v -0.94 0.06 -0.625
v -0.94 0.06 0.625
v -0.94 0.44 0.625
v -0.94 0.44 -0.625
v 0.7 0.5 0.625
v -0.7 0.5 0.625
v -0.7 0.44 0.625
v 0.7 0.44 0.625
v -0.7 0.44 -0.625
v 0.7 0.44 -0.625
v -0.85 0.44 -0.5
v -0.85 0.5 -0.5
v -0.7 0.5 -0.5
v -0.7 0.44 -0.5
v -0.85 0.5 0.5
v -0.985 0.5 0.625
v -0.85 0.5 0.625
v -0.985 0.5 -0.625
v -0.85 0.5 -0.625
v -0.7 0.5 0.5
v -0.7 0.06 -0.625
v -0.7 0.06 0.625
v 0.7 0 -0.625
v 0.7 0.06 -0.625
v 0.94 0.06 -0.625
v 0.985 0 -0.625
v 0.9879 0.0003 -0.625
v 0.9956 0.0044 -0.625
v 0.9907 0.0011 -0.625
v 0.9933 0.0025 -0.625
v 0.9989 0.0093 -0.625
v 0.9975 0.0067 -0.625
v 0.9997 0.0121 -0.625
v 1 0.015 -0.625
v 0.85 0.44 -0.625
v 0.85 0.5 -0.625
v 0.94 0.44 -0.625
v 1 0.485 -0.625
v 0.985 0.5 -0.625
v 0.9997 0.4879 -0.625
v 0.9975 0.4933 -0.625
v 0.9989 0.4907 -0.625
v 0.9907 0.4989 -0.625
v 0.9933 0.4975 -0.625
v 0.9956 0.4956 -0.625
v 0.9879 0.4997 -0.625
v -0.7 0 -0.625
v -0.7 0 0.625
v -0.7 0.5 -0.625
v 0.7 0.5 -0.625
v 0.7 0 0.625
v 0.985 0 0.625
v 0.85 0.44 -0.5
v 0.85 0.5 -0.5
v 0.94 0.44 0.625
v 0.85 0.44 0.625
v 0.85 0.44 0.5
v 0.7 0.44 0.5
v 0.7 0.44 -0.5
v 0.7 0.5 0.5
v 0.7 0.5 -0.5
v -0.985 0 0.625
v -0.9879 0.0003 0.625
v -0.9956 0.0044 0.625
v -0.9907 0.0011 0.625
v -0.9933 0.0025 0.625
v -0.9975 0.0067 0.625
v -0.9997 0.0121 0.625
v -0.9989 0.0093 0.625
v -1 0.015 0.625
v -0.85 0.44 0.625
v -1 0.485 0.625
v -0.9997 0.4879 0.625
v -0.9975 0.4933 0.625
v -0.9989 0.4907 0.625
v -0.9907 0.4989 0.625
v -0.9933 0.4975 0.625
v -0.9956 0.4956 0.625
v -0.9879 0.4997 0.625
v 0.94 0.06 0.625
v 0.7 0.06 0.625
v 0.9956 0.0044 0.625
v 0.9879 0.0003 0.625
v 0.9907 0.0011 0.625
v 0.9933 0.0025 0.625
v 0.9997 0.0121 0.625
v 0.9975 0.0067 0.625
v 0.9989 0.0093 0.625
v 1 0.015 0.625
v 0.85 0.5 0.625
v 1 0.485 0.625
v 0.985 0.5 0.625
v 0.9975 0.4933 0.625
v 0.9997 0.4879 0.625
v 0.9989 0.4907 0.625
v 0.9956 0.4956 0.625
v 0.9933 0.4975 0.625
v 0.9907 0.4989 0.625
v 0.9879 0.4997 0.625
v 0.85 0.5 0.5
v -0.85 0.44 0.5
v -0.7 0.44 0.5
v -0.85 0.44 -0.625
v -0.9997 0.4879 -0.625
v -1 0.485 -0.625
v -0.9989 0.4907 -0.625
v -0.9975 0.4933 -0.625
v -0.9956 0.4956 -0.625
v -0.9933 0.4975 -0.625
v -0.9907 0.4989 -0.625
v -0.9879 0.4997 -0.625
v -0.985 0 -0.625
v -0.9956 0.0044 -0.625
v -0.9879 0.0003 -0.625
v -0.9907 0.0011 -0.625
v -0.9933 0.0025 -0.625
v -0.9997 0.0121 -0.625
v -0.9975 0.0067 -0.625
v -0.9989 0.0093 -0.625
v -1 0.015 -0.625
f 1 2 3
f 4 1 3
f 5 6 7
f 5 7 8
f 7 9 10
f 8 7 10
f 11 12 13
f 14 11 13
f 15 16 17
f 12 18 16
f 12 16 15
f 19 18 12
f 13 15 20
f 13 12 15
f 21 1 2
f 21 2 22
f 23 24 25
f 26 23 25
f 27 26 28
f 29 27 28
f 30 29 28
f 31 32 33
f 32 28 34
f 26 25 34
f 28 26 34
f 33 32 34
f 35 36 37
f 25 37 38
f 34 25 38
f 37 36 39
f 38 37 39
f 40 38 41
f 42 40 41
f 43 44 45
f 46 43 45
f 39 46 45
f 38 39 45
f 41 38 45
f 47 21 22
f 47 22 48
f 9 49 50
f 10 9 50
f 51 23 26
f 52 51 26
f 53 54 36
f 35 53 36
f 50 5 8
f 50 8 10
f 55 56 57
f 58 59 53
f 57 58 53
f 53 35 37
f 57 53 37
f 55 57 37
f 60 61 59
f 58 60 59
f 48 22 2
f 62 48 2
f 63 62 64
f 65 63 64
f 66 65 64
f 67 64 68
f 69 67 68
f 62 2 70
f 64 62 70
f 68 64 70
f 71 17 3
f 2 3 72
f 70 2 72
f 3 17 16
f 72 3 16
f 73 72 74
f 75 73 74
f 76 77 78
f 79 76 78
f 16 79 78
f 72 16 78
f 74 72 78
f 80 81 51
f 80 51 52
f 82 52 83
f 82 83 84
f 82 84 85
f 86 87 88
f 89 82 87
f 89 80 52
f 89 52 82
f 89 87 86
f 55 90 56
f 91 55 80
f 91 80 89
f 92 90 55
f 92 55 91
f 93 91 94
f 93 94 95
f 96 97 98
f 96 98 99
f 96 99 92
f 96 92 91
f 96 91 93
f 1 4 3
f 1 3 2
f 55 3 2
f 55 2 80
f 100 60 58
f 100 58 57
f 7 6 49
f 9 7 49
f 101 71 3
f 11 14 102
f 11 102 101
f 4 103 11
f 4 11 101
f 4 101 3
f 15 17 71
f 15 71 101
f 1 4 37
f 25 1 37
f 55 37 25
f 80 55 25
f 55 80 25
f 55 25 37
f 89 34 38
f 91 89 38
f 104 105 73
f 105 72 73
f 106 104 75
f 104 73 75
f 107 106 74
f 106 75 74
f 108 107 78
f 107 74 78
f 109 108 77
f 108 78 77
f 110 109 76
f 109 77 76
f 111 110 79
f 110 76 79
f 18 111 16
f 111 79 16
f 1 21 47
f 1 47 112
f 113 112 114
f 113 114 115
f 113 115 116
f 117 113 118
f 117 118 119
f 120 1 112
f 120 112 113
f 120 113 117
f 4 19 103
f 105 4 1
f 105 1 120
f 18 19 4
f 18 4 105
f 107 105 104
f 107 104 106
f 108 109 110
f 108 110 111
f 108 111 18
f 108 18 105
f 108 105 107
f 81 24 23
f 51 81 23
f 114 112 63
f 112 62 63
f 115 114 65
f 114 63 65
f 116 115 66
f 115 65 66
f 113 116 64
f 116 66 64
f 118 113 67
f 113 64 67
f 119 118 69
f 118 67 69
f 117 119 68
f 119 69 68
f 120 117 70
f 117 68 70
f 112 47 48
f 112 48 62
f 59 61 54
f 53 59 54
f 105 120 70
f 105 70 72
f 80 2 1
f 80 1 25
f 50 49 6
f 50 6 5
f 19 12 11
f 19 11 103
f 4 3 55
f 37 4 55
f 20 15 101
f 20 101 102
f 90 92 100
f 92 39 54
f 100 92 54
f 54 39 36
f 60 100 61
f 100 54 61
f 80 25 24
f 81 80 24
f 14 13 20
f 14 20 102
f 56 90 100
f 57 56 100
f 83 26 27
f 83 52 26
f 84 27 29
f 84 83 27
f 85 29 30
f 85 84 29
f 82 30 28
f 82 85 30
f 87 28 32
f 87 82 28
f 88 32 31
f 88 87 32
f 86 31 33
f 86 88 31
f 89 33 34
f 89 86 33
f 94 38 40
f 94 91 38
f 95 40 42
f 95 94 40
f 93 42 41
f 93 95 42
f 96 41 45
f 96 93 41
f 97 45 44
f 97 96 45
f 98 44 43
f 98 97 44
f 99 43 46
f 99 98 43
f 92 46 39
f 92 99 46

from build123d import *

# Parameters (mm, degrees)
BOSS_EXTRUDE1_DEPTH        = 0.625
BOSS_EXTRUDE1_DEPTH_BACK   = 0.625
BOSS_EXTRUDE1_2_DEPTH      = 0.625
BOSS_EXTRUDE1_2_DEPTH_BACK = 0.625
SKETCH3_W                  = 1.7
SKETCH3_H                  = 0.125
CUT_EXTRUDE1_DEPTH         = 0.06
FILLET1_R                  = 0.015
FILLET2_R                  = 0.015
SKETCH4_W                  = 1.88
SKETCH4_H                  = 0.38
BOSS_EXTRUDE2_DEPTH        = 1.25
SKETCH5_W                  = 1.4
SKETCH5_H                  = 1.25
BOSS_EXTRUDE3_DEPTH        = 0.06


with BuildPart() as part:
    # Sketch2 → Boss-Extrude1 (new, two sides: drawn at the far end of the back side and taken through both)
    with BuildSketch(Plane.XY.offset(-BOSS_EXTRUDE1_DEPTH_BACK)):
        Polygon((-0.7, 0), (-1, 0), (-1, 0.5), (-0.7, 0.5), (-0.7, 0.44), (-0.94, 0.44), (-0.94, 0.06), (-0.7, 0.06), align=None)
    extrude(amount=BOSS_EXTRUDE1_DEPTH + BOSS_EXTRUDE1_DEPTH_BACK)


with BuildPart() as body_2:
    # Sketch2 → Boss-Extrude1 2 (new, two sides: drawn at the far end of the back side and taken through both)
    with BuildSketch(Plane.XY.offset(-BOSS_EXTRUDE1_2_DEPTH_BACK)):
        Polygon((0.7, 0.06), (0.7, 0), (1, 0), (1, 0.5), (0.7, 0.5), (0.7, 0.44), (0.94, 0.44), (0.94, 0.06), align=None)
    extrude(amount=BOSS_EXTRUDE1_2_DEPTH + BOSS_EXTRUDE1_2_DEPTH_BACK)


with BuildPart() as cut_extrude1_tool:
    # Sketch3 → Cut-Extrude1 (new body)
    with BuildSketch(Plane(origin=(0, 0.5, 0), x_dir=(1, 0, 0), z_dir=(0, 1, 0))):
        with Locations((0, 0.5625)):
            Rectangle(SKETCH3_W, SKETCH3_H)
        with Locations((0, -0.5625)):
            Rectangle(SKETCH3_W, SKETCH3_H)
    extrude(amount=-CUT_EXTRUDE1_DEPTH)


with BuildPart() as part_1:
    add(part.part)

    # Cut-Extrude1: cut by cut_extrude1_tool
    add(cut_extrude1_tool.part, mode=Mode.SUBTRACT)

    # Fillet1
    fillet1_edges = [part_1.edges().sort_by_distance(p)[0] for p in [
        (-1, 0, 0),
        (-1, 0.5, 0),
    ]]
    fillet(fillet1_edges, radius=FILLET1_R)


with BuildPart() as body_2_1:
    add(body_2.part)

    # Cut-Extrude1: cut by cut_extrude1_tool
    add(cut_extrude1_tool.part, mode=Mode.SUBTRACT)

    # Fillet2
    fillet2_edges = [body_2_1.edges().sort_by_distance(p)[0] for p in [
        (1, 0, 0),
        (1, 0.5, 0),
    ]]
    fillet(fillet2_edges, radius=FILLET2_R)


with BuildPart() as body_3:
    # Sketch4 → Boss-Extrude2 (new body)
    with BuildSketch(Plane.XY.offset(0.625)):
        with Locations((0, 0.25)):
            Rectangle(SKETCH4_W, SKETCH4_H)
    extrude(amount=-BOSS_EXTRUDE2_DEPTH)


with BuildPart() as body_4:
    # Sketch5 → Boss-Extrude3 (new body)
    with BuildSketch(Plane(origin=(0, 0.5, 0), x_dir=(1, 0, 0), z_dir=(0, 1, 0))):
        Rectangle(SKETCH5_W, SKETCH5_H)
    extrude(amount=-BOSS_EXTRUDE3_DEPTH)


solid = Compound([part_1.part, body_2_1.part, body_3.part, body_4.part])
